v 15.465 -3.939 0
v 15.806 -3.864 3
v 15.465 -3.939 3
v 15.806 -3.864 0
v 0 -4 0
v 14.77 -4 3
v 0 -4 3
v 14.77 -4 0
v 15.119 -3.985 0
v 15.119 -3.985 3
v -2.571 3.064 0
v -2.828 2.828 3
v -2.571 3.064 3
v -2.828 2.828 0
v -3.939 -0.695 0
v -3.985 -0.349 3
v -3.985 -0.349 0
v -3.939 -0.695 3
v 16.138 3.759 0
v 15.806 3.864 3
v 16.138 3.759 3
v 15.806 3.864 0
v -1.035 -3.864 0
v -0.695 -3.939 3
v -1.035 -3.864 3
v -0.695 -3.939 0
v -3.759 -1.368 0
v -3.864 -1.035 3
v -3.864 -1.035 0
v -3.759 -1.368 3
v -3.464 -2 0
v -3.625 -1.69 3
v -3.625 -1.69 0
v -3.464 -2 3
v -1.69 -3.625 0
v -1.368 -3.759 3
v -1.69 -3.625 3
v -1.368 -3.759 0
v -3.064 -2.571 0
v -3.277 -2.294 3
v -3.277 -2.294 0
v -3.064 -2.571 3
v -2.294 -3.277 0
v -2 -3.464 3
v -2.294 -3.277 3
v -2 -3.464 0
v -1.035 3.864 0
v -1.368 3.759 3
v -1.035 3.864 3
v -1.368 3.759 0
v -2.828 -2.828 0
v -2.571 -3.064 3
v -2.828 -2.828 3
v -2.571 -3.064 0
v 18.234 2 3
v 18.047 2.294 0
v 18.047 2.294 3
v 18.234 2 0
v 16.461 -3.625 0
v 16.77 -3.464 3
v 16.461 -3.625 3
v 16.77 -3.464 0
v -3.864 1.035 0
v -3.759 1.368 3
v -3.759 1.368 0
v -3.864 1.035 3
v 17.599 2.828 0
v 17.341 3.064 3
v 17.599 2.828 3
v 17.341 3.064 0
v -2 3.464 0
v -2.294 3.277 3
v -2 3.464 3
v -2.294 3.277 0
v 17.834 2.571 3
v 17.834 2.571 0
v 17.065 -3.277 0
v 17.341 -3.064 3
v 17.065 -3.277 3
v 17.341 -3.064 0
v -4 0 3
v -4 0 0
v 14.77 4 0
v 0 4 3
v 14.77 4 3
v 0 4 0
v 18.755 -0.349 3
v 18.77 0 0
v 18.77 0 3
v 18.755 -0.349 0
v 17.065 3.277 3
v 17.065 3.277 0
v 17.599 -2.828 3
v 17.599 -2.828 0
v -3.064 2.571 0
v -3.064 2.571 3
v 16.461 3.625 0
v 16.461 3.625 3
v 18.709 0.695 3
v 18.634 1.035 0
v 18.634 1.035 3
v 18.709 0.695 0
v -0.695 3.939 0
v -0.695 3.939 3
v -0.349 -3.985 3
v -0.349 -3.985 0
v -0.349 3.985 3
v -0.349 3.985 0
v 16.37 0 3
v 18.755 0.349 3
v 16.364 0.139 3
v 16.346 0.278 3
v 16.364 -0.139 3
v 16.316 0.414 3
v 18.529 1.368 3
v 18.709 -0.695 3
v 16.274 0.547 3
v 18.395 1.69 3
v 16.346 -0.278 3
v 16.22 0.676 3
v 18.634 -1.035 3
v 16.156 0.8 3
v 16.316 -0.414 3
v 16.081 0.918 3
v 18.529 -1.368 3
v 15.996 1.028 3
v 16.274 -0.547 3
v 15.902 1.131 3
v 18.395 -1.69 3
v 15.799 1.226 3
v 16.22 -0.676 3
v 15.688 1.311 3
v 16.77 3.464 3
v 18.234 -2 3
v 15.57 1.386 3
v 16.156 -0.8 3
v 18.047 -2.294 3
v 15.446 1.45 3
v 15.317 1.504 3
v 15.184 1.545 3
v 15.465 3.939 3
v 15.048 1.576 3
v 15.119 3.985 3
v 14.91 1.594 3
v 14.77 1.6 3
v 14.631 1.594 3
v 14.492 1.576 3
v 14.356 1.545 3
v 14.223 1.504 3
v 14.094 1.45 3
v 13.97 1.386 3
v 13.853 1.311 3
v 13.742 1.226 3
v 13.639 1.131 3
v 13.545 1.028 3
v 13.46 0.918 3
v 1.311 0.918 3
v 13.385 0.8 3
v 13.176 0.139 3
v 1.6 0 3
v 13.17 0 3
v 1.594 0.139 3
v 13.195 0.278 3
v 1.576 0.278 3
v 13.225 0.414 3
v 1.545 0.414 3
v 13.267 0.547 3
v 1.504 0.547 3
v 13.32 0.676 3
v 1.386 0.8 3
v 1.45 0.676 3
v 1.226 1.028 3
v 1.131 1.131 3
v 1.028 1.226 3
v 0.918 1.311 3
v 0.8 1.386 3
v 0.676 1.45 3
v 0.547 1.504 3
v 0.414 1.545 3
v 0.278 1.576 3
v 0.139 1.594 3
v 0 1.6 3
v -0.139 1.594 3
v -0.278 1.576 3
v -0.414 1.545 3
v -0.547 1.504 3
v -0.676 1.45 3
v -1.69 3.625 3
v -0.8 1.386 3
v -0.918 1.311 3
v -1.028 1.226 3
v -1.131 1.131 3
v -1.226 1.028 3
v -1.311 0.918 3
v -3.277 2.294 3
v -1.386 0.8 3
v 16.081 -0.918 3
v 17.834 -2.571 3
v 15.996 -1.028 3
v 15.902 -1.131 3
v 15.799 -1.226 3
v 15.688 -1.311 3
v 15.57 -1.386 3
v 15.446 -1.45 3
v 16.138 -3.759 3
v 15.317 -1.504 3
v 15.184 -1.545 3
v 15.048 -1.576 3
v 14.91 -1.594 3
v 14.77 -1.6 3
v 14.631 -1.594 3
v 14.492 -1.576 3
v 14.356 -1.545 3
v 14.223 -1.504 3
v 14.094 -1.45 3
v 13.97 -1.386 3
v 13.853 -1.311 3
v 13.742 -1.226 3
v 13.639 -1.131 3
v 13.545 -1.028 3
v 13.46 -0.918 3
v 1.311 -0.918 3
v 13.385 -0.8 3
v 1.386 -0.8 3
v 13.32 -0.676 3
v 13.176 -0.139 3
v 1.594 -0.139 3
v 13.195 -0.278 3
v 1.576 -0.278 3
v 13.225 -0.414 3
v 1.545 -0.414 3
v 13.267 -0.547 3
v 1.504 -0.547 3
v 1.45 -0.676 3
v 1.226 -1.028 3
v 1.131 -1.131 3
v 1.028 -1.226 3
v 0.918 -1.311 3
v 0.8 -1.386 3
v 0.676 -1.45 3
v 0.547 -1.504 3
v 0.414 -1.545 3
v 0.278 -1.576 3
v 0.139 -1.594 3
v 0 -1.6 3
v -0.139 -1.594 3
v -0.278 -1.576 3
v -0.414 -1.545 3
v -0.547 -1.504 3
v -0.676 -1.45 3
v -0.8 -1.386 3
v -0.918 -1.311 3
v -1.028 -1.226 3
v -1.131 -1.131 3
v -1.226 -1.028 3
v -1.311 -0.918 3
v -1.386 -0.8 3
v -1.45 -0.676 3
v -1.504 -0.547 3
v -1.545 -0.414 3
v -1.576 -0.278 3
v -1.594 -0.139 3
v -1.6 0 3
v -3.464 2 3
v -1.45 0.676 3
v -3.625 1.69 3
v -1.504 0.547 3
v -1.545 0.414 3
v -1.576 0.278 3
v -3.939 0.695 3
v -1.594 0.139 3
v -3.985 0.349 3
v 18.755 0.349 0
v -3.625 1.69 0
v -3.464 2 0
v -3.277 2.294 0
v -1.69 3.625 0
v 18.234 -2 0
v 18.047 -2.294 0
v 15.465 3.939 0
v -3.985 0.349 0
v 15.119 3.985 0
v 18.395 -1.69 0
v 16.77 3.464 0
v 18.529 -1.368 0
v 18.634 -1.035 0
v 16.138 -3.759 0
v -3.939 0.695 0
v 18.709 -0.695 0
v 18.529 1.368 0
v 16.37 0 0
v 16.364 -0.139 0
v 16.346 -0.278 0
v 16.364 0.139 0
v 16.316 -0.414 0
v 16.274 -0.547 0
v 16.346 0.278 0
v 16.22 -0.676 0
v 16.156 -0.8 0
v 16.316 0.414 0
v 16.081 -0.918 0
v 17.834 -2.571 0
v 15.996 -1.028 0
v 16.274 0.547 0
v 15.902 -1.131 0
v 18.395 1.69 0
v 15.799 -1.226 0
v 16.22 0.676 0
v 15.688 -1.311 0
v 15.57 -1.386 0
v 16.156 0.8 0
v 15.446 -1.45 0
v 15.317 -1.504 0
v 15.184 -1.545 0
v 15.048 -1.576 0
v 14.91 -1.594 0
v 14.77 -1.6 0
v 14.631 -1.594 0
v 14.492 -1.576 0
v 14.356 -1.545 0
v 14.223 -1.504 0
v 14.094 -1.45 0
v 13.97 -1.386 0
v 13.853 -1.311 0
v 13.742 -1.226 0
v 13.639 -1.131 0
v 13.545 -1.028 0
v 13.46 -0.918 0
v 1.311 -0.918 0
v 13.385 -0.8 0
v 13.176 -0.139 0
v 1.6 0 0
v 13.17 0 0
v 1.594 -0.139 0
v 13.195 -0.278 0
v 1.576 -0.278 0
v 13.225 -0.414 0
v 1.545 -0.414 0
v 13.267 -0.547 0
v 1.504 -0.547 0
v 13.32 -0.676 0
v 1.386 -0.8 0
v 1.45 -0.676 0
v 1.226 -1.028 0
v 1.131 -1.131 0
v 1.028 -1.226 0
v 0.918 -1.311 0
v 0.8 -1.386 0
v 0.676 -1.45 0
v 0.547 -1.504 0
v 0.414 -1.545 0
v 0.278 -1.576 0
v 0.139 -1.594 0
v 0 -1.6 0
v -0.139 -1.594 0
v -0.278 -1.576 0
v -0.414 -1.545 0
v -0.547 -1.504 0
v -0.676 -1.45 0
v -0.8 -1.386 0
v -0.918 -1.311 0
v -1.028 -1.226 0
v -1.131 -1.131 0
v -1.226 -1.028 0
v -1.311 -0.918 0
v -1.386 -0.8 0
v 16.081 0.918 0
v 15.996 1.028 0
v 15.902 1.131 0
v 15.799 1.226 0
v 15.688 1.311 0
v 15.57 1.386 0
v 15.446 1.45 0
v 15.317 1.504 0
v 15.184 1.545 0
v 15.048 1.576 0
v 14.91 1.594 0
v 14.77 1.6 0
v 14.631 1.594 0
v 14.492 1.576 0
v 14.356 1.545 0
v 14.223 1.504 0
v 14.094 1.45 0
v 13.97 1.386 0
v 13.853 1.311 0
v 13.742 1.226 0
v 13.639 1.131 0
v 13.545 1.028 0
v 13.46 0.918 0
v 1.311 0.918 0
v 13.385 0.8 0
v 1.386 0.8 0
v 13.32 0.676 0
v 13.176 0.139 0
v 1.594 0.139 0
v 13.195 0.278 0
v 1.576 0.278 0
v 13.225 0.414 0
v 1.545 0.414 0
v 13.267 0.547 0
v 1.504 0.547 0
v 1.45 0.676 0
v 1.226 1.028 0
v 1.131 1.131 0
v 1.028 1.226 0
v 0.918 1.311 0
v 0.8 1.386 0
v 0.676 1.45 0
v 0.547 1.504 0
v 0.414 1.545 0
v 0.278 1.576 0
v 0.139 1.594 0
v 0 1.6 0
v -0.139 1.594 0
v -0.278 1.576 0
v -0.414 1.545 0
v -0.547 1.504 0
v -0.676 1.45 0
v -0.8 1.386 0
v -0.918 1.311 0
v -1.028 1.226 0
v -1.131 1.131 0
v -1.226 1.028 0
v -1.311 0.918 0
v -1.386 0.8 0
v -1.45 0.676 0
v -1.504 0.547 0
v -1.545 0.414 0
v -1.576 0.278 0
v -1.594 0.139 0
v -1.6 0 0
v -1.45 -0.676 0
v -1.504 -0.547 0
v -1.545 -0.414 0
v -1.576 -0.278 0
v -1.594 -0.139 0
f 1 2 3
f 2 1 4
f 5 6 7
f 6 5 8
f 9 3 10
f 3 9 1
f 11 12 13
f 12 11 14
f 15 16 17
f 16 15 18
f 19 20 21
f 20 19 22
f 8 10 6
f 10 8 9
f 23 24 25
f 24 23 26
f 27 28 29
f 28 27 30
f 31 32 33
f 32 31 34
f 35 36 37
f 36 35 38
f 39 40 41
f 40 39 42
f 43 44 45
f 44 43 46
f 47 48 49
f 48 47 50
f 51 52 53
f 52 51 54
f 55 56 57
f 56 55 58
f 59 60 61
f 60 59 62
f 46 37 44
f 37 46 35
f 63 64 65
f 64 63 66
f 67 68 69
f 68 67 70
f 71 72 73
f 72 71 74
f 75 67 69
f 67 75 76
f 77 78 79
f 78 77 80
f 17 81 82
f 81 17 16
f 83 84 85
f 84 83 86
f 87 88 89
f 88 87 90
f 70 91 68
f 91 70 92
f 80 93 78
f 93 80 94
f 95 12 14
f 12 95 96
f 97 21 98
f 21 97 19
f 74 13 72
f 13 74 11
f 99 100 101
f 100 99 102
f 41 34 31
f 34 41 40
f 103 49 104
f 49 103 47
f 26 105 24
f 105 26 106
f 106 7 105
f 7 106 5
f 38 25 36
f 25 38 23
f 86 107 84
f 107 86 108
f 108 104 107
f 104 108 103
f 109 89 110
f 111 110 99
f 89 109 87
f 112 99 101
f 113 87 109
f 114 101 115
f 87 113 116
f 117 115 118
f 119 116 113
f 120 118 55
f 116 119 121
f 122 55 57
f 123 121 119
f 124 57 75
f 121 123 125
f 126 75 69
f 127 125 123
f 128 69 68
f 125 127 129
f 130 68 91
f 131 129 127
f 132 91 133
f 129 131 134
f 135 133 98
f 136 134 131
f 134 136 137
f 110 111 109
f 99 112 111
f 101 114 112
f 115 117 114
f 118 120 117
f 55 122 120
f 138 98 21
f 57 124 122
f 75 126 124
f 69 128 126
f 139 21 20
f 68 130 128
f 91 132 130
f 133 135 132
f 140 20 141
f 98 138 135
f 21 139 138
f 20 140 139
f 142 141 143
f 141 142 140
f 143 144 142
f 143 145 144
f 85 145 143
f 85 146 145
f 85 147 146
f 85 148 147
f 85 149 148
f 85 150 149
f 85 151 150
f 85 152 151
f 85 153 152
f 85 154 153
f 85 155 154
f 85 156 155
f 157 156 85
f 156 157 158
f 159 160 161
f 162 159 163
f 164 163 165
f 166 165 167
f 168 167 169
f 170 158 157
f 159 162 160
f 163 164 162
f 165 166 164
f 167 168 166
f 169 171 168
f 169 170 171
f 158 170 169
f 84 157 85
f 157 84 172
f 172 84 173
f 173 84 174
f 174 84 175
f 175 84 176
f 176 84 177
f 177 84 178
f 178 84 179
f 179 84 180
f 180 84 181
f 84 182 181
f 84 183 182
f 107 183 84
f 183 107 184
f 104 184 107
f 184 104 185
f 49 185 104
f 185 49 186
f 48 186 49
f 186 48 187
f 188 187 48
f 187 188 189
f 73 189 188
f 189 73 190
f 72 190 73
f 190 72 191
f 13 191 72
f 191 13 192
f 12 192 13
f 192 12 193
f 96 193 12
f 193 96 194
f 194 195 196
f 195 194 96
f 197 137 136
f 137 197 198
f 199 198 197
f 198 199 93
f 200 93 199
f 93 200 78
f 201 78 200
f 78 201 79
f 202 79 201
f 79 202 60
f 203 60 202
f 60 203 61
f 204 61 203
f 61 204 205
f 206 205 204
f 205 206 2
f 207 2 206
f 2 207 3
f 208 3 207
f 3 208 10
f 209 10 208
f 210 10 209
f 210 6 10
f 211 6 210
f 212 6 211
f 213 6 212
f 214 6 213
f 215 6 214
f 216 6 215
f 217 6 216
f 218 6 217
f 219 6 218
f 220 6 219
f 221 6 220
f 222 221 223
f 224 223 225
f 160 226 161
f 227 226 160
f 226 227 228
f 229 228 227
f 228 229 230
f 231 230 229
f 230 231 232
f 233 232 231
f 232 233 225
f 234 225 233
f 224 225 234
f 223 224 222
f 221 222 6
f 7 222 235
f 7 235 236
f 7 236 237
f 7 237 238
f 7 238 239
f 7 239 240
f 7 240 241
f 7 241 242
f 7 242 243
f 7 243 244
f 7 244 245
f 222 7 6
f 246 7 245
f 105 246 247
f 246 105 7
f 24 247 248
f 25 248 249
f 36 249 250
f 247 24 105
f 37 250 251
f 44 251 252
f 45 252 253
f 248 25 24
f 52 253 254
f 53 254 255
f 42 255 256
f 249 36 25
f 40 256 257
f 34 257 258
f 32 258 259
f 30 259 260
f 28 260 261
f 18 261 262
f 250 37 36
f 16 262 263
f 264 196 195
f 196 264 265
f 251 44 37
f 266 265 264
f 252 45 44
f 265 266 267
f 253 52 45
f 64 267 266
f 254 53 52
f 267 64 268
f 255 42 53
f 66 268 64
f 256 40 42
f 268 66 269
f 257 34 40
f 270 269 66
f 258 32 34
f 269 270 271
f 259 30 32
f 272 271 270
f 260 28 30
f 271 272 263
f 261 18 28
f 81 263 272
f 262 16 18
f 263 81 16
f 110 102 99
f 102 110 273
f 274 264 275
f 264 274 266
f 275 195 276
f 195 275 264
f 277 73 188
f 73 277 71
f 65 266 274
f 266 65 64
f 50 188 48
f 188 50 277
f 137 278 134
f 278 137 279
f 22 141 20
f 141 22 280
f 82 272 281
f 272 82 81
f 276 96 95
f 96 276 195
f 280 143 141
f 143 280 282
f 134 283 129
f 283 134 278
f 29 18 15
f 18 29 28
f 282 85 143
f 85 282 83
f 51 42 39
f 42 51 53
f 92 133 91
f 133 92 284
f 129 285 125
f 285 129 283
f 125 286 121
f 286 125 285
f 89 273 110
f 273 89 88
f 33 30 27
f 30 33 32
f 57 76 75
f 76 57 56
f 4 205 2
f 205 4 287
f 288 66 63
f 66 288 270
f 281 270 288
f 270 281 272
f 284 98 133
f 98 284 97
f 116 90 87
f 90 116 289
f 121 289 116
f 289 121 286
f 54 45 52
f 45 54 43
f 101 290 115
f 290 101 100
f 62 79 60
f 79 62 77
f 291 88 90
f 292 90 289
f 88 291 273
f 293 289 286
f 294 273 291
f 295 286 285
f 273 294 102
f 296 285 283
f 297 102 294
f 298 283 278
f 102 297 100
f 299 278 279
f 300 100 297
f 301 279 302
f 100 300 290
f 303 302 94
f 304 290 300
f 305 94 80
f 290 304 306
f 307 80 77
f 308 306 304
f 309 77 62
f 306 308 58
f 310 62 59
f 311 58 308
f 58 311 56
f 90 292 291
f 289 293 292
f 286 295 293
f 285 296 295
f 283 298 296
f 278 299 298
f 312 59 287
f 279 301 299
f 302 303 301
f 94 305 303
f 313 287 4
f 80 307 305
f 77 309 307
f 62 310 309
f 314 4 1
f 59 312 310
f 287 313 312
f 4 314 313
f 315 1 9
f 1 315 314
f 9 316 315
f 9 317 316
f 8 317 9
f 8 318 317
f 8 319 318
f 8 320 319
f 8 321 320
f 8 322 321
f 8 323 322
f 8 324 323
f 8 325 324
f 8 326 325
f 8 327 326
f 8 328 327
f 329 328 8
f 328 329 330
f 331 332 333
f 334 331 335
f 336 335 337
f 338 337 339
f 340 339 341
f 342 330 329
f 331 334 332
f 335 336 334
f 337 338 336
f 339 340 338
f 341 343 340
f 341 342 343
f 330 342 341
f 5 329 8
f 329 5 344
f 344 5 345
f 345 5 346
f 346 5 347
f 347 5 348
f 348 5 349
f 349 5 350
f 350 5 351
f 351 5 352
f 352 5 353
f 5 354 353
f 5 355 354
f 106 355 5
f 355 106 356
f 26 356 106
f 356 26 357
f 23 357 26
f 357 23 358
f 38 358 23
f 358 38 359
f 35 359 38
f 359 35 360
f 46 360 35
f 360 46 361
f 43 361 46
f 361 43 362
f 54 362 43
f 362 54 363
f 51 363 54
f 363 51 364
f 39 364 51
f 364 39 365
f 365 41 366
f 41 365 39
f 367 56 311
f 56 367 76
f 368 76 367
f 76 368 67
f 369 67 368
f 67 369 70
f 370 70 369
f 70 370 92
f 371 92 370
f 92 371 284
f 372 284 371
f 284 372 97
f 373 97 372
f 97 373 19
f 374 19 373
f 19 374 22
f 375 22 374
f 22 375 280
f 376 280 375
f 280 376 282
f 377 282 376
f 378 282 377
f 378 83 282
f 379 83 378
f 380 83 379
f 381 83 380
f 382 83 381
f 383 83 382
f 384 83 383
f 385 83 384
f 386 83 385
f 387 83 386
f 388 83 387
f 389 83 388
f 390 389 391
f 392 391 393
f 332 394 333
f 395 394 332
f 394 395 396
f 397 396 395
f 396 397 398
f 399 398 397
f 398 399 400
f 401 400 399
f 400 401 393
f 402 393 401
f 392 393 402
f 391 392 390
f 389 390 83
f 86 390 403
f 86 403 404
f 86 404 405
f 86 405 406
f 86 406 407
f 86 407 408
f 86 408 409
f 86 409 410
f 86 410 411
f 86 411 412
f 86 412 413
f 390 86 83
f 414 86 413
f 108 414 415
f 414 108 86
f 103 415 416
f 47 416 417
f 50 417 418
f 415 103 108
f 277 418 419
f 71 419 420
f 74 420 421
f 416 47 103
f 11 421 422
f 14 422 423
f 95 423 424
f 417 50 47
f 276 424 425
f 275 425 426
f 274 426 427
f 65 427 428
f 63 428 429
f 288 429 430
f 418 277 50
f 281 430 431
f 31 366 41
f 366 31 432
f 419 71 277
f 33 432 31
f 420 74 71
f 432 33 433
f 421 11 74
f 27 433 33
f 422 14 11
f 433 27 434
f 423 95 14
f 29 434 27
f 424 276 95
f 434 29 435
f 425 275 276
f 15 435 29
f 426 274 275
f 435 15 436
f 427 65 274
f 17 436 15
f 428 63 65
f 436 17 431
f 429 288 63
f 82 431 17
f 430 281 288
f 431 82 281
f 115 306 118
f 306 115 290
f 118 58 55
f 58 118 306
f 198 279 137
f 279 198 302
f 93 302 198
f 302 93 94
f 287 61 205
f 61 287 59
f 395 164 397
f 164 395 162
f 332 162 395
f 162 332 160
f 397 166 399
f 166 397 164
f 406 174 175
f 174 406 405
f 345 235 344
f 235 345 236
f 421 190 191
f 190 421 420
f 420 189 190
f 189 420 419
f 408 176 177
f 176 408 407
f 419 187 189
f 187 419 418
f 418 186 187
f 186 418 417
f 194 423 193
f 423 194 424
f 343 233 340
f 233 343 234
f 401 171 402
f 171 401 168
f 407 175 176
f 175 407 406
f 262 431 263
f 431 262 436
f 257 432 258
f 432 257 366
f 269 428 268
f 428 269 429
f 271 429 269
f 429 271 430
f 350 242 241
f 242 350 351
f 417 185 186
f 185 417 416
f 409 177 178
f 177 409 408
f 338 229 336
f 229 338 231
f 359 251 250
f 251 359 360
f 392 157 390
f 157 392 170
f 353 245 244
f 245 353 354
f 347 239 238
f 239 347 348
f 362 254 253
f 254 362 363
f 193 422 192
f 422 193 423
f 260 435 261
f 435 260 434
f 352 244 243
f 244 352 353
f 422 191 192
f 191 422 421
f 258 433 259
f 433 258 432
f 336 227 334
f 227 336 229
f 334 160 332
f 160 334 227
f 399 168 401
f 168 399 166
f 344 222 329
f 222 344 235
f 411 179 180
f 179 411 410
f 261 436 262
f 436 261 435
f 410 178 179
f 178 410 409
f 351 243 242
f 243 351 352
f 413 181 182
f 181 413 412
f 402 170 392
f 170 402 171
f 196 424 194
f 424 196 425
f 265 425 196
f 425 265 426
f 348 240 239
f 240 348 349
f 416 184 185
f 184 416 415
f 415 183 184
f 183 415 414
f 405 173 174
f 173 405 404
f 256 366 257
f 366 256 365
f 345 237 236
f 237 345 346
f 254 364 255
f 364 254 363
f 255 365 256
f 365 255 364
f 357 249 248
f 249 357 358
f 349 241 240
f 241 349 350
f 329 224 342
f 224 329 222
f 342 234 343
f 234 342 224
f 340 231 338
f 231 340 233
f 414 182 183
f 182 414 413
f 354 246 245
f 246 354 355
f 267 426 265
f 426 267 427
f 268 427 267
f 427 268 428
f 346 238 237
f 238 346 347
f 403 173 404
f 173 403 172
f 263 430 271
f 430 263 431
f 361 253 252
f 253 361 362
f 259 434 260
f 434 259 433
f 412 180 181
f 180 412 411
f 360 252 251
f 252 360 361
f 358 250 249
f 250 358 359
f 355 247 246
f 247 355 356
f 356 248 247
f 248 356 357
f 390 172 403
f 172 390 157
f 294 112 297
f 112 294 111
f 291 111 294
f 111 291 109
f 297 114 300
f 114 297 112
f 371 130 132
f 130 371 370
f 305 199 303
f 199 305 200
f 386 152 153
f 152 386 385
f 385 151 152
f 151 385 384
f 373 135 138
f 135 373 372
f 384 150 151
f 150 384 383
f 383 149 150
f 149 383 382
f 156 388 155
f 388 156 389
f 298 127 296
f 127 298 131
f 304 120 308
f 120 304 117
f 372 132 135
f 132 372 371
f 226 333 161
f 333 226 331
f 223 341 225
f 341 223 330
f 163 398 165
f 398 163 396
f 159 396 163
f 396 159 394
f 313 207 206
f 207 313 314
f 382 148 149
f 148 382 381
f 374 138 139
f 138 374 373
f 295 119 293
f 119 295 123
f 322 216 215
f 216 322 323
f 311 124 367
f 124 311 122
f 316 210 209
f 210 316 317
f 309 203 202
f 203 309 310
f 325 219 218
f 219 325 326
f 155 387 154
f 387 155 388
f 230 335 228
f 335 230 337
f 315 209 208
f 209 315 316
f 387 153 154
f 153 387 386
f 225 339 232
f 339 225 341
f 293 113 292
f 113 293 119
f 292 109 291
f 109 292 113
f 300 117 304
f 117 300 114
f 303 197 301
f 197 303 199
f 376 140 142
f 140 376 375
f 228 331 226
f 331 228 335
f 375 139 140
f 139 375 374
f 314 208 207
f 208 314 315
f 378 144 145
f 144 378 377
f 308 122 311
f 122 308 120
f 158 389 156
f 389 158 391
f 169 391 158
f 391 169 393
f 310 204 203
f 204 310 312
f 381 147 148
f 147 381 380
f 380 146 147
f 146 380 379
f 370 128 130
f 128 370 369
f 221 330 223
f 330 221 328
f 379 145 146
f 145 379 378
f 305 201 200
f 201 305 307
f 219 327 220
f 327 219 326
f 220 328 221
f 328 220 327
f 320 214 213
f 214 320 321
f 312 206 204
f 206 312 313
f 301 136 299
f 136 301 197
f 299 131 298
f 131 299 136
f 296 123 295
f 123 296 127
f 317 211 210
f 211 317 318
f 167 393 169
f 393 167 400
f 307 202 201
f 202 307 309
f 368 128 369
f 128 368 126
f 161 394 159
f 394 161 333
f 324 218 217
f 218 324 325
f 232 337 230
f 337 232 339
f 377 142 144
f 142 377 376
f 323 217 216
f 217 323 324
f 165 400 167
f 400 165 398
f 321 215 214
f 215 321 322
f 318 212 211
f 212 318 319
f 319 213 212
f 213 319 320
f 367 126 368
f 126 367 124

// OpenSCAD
// Printable/cuttable nominal drilling profiles. Verify fits; finish hub clamps/retainers in CAD.
part="link_crank1"; $fn=72;
module link(L,r,bore,tip){difference(){linear_extrude(3)union(){hull(){circle(r=4);translate([L,0])circle(r=4);}circle(r=r);}translate([0,0,-1])cylinder(h=5,d=bore);translate([L,0,-1])cylinder(h=5,d=tip);}}
if(part=="link_crank1")link(14.770246488065762,4,3.2,3.2);
if(part=="link_coupler1")link(25.717149821155193,4,3.2,3.2);
if(part=="link_rocker1")link(30.969172662534824,4,3.2,3.2);
if(part=="link_crank2_direct")link(15.426379203029766,4,3.2,3.2);
if(part=="link_rod2_direct")link(143.08445221772175,4,3.2,3.2);
if(part=="link_elbow_horn")link(26.337038548069998,4,3.2,3.2);
if(part=="gear_R_distribution")difference(){linear_extrude(3)polygon(points=[[15.947761269167506, -0.9286186151123661], [16.458010533880298, -0.8717324097064117], [16.97129693137109, -0.7391934490722933], [17.48494252040787, -0.5532650089551149], [17.99713539780449, -0.3211190948737523], [17.999681703362562, -0.10704474594776049], [17.999681703362562, 0.10704474594776049], [17.99713539780449, 0.3211190948737523], [17.48494252040787, 0.5532650089551149], [16.97129693137109, 0.7391934490722933], [16.458010533880298, 0.8717324097064117], [15.947761269167506, 0.9286186151123661], [15.698376225428154, 1.2741600703648297], [15.665207836863848, 1.6321039880655595], [15.62387892156016, 1.9891976886242795], [15.846853550534847, 2.01758632494213], [16.337962039067254, 2.167261990956512], [16.81815479012593, 2.3918603519606503], [17.288890325700464, 2.6690051363761436], [17.749705446255497, 2.9913135193703635], [17.71287233773061, 3.202210728115468], [17.673533496825215, 3.4126549395737604], [17.631694488566005, 3.6226163834818466], [17.0855659684599, 3.756694377974646], [16.546501910445528, 3.845074903761904], [16.017601219169993, 3.8810410086845684], [15.50558710501007, 3.8432005619844793], [15.196955239762518, 4.13703413578551], [15.098579583761056, 4.482788702675352], [14.992338576485418, 4.8262080361322175], [15.20630024044466, 4.8950847825288015], [15.661543842239421, 5.1324528838616645], [16.092290558656405, 5.441462217427872], [16.50408570668974, 5.80038551290694], [16.897830564159506, 6.201880539397448], [16.82287234888603, 6.402418756461172], [16.745534304120532, 6.602051262261035], [16.6658273704061, 6.800749815999921], [16.10436095933375, 6.832194025610534], [15.558235612301397, 6.820016944262944], [15.031731705936048, 6.758185410907602], [14.535388768893464, 6.626906923129228], [14.178020170145595, 6.859026465537559], [14.017787311683518, 7.180817424527975], [13.850252122516656, 7.498867657368203], [14.04791461361305, 7.605886998853538], [14.451790553815561, 7.9228642495056505], [14.818422672787017, 8.305761613395173], [15.157254243406722, 8.734240717591323], [15.470520328914995, 9.20124995599119], [15.359989619011596, 9.384600092910514], [15.247286024743724, 9.56662264749973], [15.13242548960378, 9.747291870134486], [14.57474125278952, 9.675031500017798], [14.040152260427217, 9.562711487435854], [13.53397459803149, 9.405187914512169], [13.070205201529495, 9.184941917105613], [12.676269628295277, 9.347442875501233], [12.459636105189373, 9.63431202142952], [12.236511944062055, 9.916162334432947], [12.411144103231344, 10.057679855688301], [12.749898871093805, 10.443471975561016], [13.039931175534921, 10.887218259281369], [13.294260665987219, 11.37066183020524], [13.516380078713267, 11.887281841016605], [13.374040864938735, 12.047200128782984], [13.229809706898218, 12.205414172377013], [13.08370700809692, 12.361901590219667], [12.54879621335695, 12.188397380613235], [12.043948362630767, 11.979759360112405], [11.575334217404356, 11.731908023967598], [11.159931472010742, 11.430194730218577], [10.74284392776302, 11.517543329361741], [10.477186934819395, 11.759721677524931], [10.206072027430874, 11.995773996324417], [10.351726965940733, 12.166970487894996], [10.613824674135158, 12.608439789052694], [10.817380461773594, 13.097923745126785], [10.978546986295735, 13.619868691797222], [11.101955716042045, 14.168506600169312], [10.9326551896044, 14.299547213293712], [10.761808086892103, 14.428564956394789], [10.589438576606263, 14.55554157811667], [10.09551696950066, 14.286702006783285], [9.637602248468816, 13.988850895918002], [9.222509713086694, 13.659112076539566], [8.869619661075161, 13.286205970801495], [8.443583561891923, 13.295427658911484], [8.137949729384824, 13.484668116123789], [7.828076568739728, 13.666883962116165], [7.93979418235305, 13.861929532809096], [8.116309407778424, 14.34404230768492], [8.226456830404414, 14.86259514705994], [8.288972056301734, 15.405267260322045], [8.309467566789257, 15.967239860303891], [8.118971054062733, 16.06494036787225], [7.927325999853005, 16.160368265978796], [7.7345595150209645, 16.253510055018843], [7.298447003486039, 15.898490131122733], [6.903059148765105, 15.521568892240486], [6.555623701671079, 15.121171449644232], [6.277263590517918, 14.689771402096442], [5.856787084782867, 14.620552145644863], [5.521584406310946, 14.75041035510483], [5.1835053512431495, 14.87258458619865], [5.257481230618842, 15.084837193035362], [5.342402958979984, 15.59117566931145], [5.355391078223272, 16.12113869697807], [5.31712612445659, 16.66605792887816], [5.234010465657324, 17.222227917589223], [5.0288050969074405, 17.28326124599515], [4.8228883336684865, 17.34184961649029], [4.616289305733284, 17.397984740934007], [4.252837178290054, 16.968874242183986], [3.933440649057087, 16.525718476007707], [3.66549378769906, 16.06829746487745], [3.4711428371334323, 15.593094286731857], [3.0705447479433925, 15.44779126447782], [2.717188148690709, 15.513845060610047], [2.362416075939414, 15.571817179897247], [2.396131061229621, 15.794048814920858], [2.386567384919579, 16.3073702430737], [2.3019539059568674, 16.83069620374532], [2.1642118396329524, 17.35930598339962], [1.9803154156210643, 17.890733658926724], [1.767389213563883, 17.91302139137276], [1.5542129896978714, 17.93277507756829], [1.3408169007676194, 17.949991923079406], [1.0624020837033825, 17.461403692849096], [0.8298735456874967, 16.96710453748916], [0.6505398790621778, 16.4682368817429], [0.5468164776073248, 15.965413047287862], [0.17973869242521262, 15.748974379382465], [-0.17973869242521068, 15.748974379382465], [-0.5391224454246613, 15.740770215870612], [-0.5468164776073228, 15.965413047287862], [-0.6505398790621759, 16.4682368817429], [-0.8298735456874947, 16.96710453748916], [-1.0624020837033803, 17.461403692849096], [-1.340816900767617, 17.949991923079406], [-1.5542129896978691, 17.93277507756829], [-1.767389213563881, 17.91302139137276], [-1.980315415621062, 17.890733658926724], [-2.16421183963295, 17.35930598339962], [-2.301953905956865, 16.83069620374532], [-2.386567384919577, 16.3073702430737], [-2.396131061229619, 15.79404881492086], [-2.7171881486907035, 15.513845060610048], [-3.0705447479433876, 15.447791264477821], [-3.4223017985158997, 15.373690201115503], [-3.4711428371334305, 15.593094286731857], [-3.665493787699058, 16.06829746487745], [-3.9334406490570846, 16.525718476007707], [-4.2528371782900525, 16.96887424218399], [-4.616289305733282, 17.397984740934007], [-4.822888333668484, 17.34184961649029], [-5.028805096907438, 17.28326124599515], [-5.234010465657322, 17.222227917589223], [-5.317126124456587, 16.66605792887816], [-5.3553910782232705, 16.12113869697807], [-5.342402958979982, 15.59117566931145], [-5.25748123061884, 15.084837193035362], [-5.521584406310944, 14.750410355104831], [-5.856787084782865, 14.620552145644863], [-6.188938768457273, 14.483077605270454], [-6.27726359051791, 14.689771402096445], [-6.555623701671071, 15.121171449644235], [-6.903059148765097, 15.52156889224049], [-7.2984470034860305, 15.898490131122738], [-7.734559515020956, 16.25351005501885], [-7.927325999852998, 16.1603682659788], [-8.118971054062722, 16.06494036787226], [-8.309467566789248, 15.967239860303895], [-8.288972056301725, 15.405267260322049], [-8.226456830404405, 14.862595147059947], [-8.116309407778413, 14.344042307684925], [-7.9397941823530385, 13.861929532809103], [-8.137949729384813, 13.484668116123796], [-8.443583561891918, 13.295427658911487], [-8.744818851452726, 13.0992611721149], [-8.869619661075163, 13.286205970801495], [-9.222509713086694, 13.659112076539566], [-9.637602248468815, 13.988850895918004], [-10.09551696950066, 14.286702006783285], [-10.58943857660626, 14.555541578116673], [-10.761808086892103, 14.428564956394789], [-10.932655189604397, 14.299547213293714], [-11.101955716042044, 14.168506600169314], [-10.978546986295733, 13.619868691797224], [-10.817380461773592, 13.097923745126787], [-10.613824674135154, 12.608439789052698], [-10.35172696594073, 12.166970487895], [-10.47718693481939, 11.759721677524935], [-10.74284392776302, 11.517543329361741], [-11.002904616716142, 11.269365110575068], [-11.159931472010747, 11.430194730218572], [-11.57533421740436, 11.731908023967595], [-12.04394836263077, 11.979759360112403], [-12.548796213356955, 12.188397380613232], [-13.083707008096926, 12.361901590219663], [-13.229809706898221, 12.20541417237701], [-13.374040864938735, 12.047200128782984], [-13.516380078713269, 11.887281841016604], [-13.29426066598722, 11.370661830205238], [-13.039931175534923, 10.887218259281365], [-12.749898871093807, 10.443471975561016], [-12.411144103231344, 10.057679855688301], [-12.459636105189373, 9.63431202142952], [-12.676269628295278, 9.347442875501228], [-12.886299661786833, 9.055704336308278], [-13.070205201529493, 9.184941917105613], [-13.533974598031488, 9.405187914512172], [-14.040152260427215, 9.562711487435857], [-14.574741252789519, 9.6750315000178], [-15.132425489603774, 9.747291870134493], [-15.247286024743723, 9.566622647499733], [-15.359989619011593, 9.384600092910519], [-15.47052032891499, 9.201249955991196], [-15.157254243406719, 8.73424071759133], [-14.818422672787015, 8.30576161339518], [-14.451790553815556, 7.922864249505658], [-14.047914613613047, 7.605886998853544], [-14.017787311683515, 7.180817424527983], [-14.178020170145594, 6.8590264655375615], [-14.330867227288286, 6.533662411988743], [-14.535388768893462, 6.626906923129232], [-15.031731705936046, 6.758185410907607], [-15.558235612301395, 6.82001694426295], [-16.104360959333746, 6.832194025610539], [-16.665827370406095, 6.800749815999928], [-16.74553430412053, 6.602051262261039], [-16.822872348886026, 6.402418756461181], [-16.897830564159506, 6.201880539397455], [-16.504085706689736, 5.800385512906948], [-16.0922905586564, 5.441462217427879], [-15.661543842239418, 5.132452883861673], [-15.206300240444657, 4.8950847825288095], [-15.098579583761055, 4.482788702675361], [-15.196955239762516, 4.137034135785513], [-15.28741429734519, 3.789124450493261], [-15.50558710501007, 3.843200561984477], [-16.017601219169993, 3.881041008684567], [-16.546501910445528, 3.8450749037619043], [-17.0855659684599, 3.7566943779746444], [-17.631694488566005, 3.6226163834818466], [-17.673533496825215, 3.4126549395737578], [-17.71287233773061, 3.2022107281154715], [-17.749705446255497, 2.991313519370365], [-17.28889032570046, 2.6690051363761453], [-16.81815479012593, 2.391860351960652], [-16.337962039067254, 2.1672619909565145], [-15.846853550534847, 2.0175863249421337], [-15.665207836863848, 1.6321039880655641], [-15.698376225428154, 1.2741600703648277], [-15.723366808738513, 0.9155524003900942], [-15.947761269167506, 0.9286186151123651], [-16.458010533880298, 0.8717324097064113], [-16.97129693137109, 0.7391934490722951], [-17.48494252040787, 0.5532650089551157], [-17.99713539780449, 0.3211190948737543], [-17.999681703362562, 0.10704474594775995], [-17.999681703362562, -0.10704474594775554], [-17.99713539780449, -0.32111909487374984], [-17.48494252040787, -0.5532650089551114], [-16.97129693137109, -0.739193449072291], [-16.458010533880298, -0.8717324097064073], [-15.947761269167506, -0.9286186151123612], [-15.698376225428154, -1.274160070364824], [-15.665207836863848, -1.6321039880655601], [-15.62387892156016, -1.989197688624279], [-15.846853550534847, -2.0175863249421297], [-16.337962039067254, -2.1672619909565105], [-16.81815479012593, -2.3918603519606476], [-17.288890325700464, -2.6690051363761413], [-17.7497054462555, -2.9913135193703604], [-17.71287233773061, -3.202210728115467], [-17.673533496825215, -3.4126549395737538], [-17.63169448856601, -3.6226163834818426], [-17.0855659684599, -3.756694377974641], [-16.546501910445528, -3.8450749037619003], [-16.017601219169997, -3.881041008684563], [-15.505587105010072, -3.843200561984473], [-15.19695523976252, -4.137034135785503], [-15.098579583761058, -4.482788702675351], [-14.992338576485418, -4.826208036132215], [-15.20630024044466, -4.895084782528799], [-15.661543842239421, -5.132452883861663], [-16.092290558656405, -5.441462217427867], [-16.50408570668974, -5.800385512906937], [-16.89783056415951, -6.201880539397443], [-16.822872348886033, -6.40241875646117], [-16.745534304120536, -6.602051262261027], [-16.6658273704061, -6.800749815999915], [-16.10436095933375, -6.832194025610528], [-15.558235612301402, -6.820016944262941], [-15.03173170593605, -6.758185410907596], [-14.535388768893467, -6.626906923129221], [-14.178020170145599, -6.859026465537551], [-14.01778731168352, -7.180817424527973], [-13.850252122516657, -7.498867657368201], [-14.047914613613049, -7.605886998853541], [-14.451790553815558, -7.922864249505655], [-14.818422672787017, -8.305761613395175], [-15.15725424340672, -8.734240717591327], [-15.470520328914994, -9.201249955991193], [-15.359989619011595, -9.384600092910516], [-15.247286024743724, -9.56662264749973], [-15.132425489603776, -9.74729187013449], [-14.57474125278952, -9.675031500017797], [-14.040152260427217, -9.562711487435854], [-13.53397459803149, -9.405187914512169], [-13.070205201529495, -9.184941917105611], [-12.676269628295277, -9.347442875501232], [-12.459636105189372, -9.634312021429523], [-12.236511944062054, -9.916162334432949], [-12.411144103231342, -10.057679855688303], [-12.749898871093805, -10.443471975561017], [-13.039931175534921, -10.887218259281367], [-13.294260665987219, -11.370661830205242], [-13.516380078713267, -11.887281841016605], [-13.374040864938733, -12.047200128782986], [-13.22980970689822, -12.205414172377013], [-13.08370700809692, -12.361901590219667], [-12.54879621335695, -12.188397380613235], [-12.043948362630767, -11.979759360112405], [-11.575334217404357, -11.731908023967597], [-11.159931472010745, -11.430194730218574], [-10.742843927763024, -11.51754332936174], [-10.477186934819393, -11.759721677524931], [-10.206072027430874, -11.995773996324417], [-10.351726965940744, -12.166970487894988], [-10.613824674135174, -12.608439789052682], [-10.817380461773608, -13.097923745126772], [-10.978546986295747, -13.61986869179721], [-11.101955716042067, -14.168506600169296], [-10.932655189604414, -14.299547213293703], [-10.761808086892119, -14.428564956394776], [-10.58943857660627, -14.555541578116664], [-10.095516969500673, -14.286702006783274], [-9.637602248468832, -13.988850895917993], [-9.222509713086703, -13.659112076539559], [-8.869619661075177, -13.286205970801484], [-8.44358356189194, -13.295427658911473], [-8.137949729384829, -13.484668116123785], [-7.828076568739732, -13.666883962116163], [-7.9397941823530545, -13.861929532809095], [-8.116309407778436, -14.344042307684912], [-8.226456830404423, -14.862595147059936], [-8.288972056301743, -15.40526726032204], [-8.309467566789273, -15.967239860303884], [-8.11897105406274, -16.06494036787225], [-7.927325999853018, -16.160368265978793], [-7.734559515020966, -16.253510055018843], [-7.298447003486049, -15.89849013112273], [-6.903059148765115, -15.521568892240483], [-6.555623701671085, -15.121171449644228], [-6.277263590517929, -14.689771402096437], [-5.856787084782878, -14.620552145644858], [-5.521584406310944, -14.750410355104831], [-5.183505351243148, -14.87258458619865], [-5.25748123061884, -15.084837193035362], [-5.3424029589799895, -15.591175669311449], [-5.355391078223274, -16.12113869697807], [-5.317126124456592, -16.666057928878157], [-5.2340104656573345, -17.22222791758922], [-5.028805096907438, -17.28326124599515], [-4.822888333668493, -17.34184961649029], [-4.61628930573328, -17.397984740934007], [-4.252837178290056, -16.968874242183986], [-3.9334406490570886, -16.525718476007707], [-3.6654937876990585, -16.06829746487745], [-3.471142837133438, -15.593094286731855], [-3.070544747943398, -15.44779126447782], [-2.717188148690701, -15.513845060610048], [-2.362416075939406, -15.571817179897248], [-2.396131061229616, -15.79404881492086], [-2.386567384919581, -16.3073702430737], [-2.3019539059568657, -16.83069620374532], [-2.1642118396329506, -17.35930598339962], [-1.9803154156210705, -17.890733658926724], [-1.7673892135638771, -17.91302139137276], [-1.5542129896978736, -17.93277507756829], [-1.3408169007676096, -17.94999192307941], [-1.062402083703381, -17.461403692849096], [-0.8298735456874952, -16.96710453748916], [-0.6505398790621726, -16.4682368817429], [-0.5468164776073267, -15.965413047287862], [-0.17973869242521454, -15.748974379382465], [0.17973869242522275, -15.748974379382465], [0.5391224454246734, -15.740770215870612], [0.546816477607335, -15.965413047287862], [0.6505398790621811, -16.4682368817429], [0.8298735456875039, -16.96710453748916], [1.06240208370339, -17.461403692849096], [1.3408169007676187, -17.949991923079406], [1.554212989697883, -17.932775077568287], [1.7673892135638867, -17.91302139137276], [1.9803154156210798, -17.89073365892672], [2.16421183963296, -17.35930598339962], [2.3019539059568745, -16.830696203745315], [2.3865673849195894, -16.3073702430737], [2.396131061229624, -15.794048814920858], [2.717188148690709, -15.513845060610047], [3.070544747943406, -15.447791264477818], [3.4223017985159183, -15.3736902011155], [3.4711428371334323, -15.593094286731857], [3.6654937876990523, -16.06829746487745], [3.9334406490570824, -16.525718476007707], [4.25283717829005, -16.96887424218399], [4.616289305733273, -17.397984740934007], [4.822888333668486, -17.34184961649029], [5.0288050969074325, -17.28326124599515], [5.234010465657328, -17.222227917589223], [5.317126124456585, -16.66605792887816], [5.355391078223269, -16.12113869697807], [5.342402958979983, -15.59117566931145], [5.2574812306188345, -15.084837193035364], [5.5215844063109385, -14.750410355104833], [5.856787084782873, -14.620552145644861], [6.188938768457281, -14.48307760527045], [6.277263590517911, -14.689771402096444], [6.555623701671066, -15.121171449644237], [6.903059148765095, -15.52156889224049], [7.298447003486029, -15.89849013112274], [7.734559515020945, -16.253510055018854], [7.927325999852997, -16.160368265978803], [8.118971054062719, -16.06494036787226], [8.309467566789253, -15.967239860303893], [8.288972056301724, -15.405267260322052], [8.226456830404404, -14.862595147059947], [8.116309407778418, -14.344042307684923], [7.939794182353037, -13.861929532809103], [8.137949729384811, -13.484668116123796], [8.443583561891922, -13.295427658911485], [8.744818851452731, -13.099261172114897], [8.869619661075161, -13.286205970801495], [9.222509713086685, -13.659112076539573], [9.637602248468813, -13.988850895918008], [10.095516969500657, -14.286702006783285], [10.589438576606252, -14.555541578116678], [10.761808086892101, -14.42856495639479], [10.932655189604395, -14.299547213293717], [11.101955716042049, -14.16850660016931], [10.978546986295731, -13.619868691797226], [10.81738046177359, -13.097923745126788], [10.613824674135158, -12.608439789052694], [10.351726965940728, -12.166970487895002], [10.47718693481939, -11.759721677524936], [10.742843927763026, -11.51754332936174], [11.002904616716146, -11.269365110575064], [11.159931472010737, -11.430194730218583], [11.575334217404343, -11.73190802396761], [12.043948362630756, -11.979759360112418], [12.54879621335694, -12.188397380613244], [13.083707008096907, -12.361901590219682], [13.229809706898209, -12.205414172377024], [13.374040864938722, -12.047200128782997], [13.516380078713262, -11.88728184101661], [13.29426066598721, -11.37066183020525], [13.039931175534912, -10.887218259281378], [12.749898871093801, -10.443471975561023], [12.411144103231333, -10.057679855688313], [12.459636105189364, -9.634312021429531], [12.676269628295273, -9.347442875501237], [12.886299661786827, -9.055704336308285], [13.070205201529491, -9.184941917105613], [13.533974598031483, -9.40518791451218], [14.040152260427213, -9.562711487435859], [14.574741252789519, -9.675031500017804], [15.132425489603769, -9.7472918701345], [15.247286024743719, -9.566622647499734], [15.35998961901159, -9.38460009291052], [15.470520328914994, -9.201249955991193], [15.157254243406719, -8.734240717591332], [14.818422672787014, -8.305761613395182], [14.451790553815561, -7.922864249505652], [14.047914613613045, -7.605886998853546], [14.017787311683513, -7.1808174245279845], [14.178020170145595, -6.859026465537556], [14.330867227288289, -6.533662411988738], [14.535388768893466, -6.626906923129226], [15.031731705936044, -6.7581854109076085], [15.558235612301397, -6.820016944262946], [16.10436095933375, -6.8321940256105345], [16.665827370406095, -6.80074981599993], [16.745534304120532, -6.602051262261033], [16.82287234888603, -6.402418756461176], [16.89783056415951, -6.201880539397442], [16.50408570668974, -5.800385512906943], [16.092290558656405, -5.4414622174278735], [15.661543842239421, -5.132452883861662], [15.206300240444659, -4.895084782528805], [15.098579583761056, -4.482788702675357], [15.19695523976252, -4.137034135785502], [15.287414297345194, -3.7891244504932495], [15.505587105010072, -3.8432005619844722], [16.017601219169993, -3.881041008684569], [16.546501910445528, -3.845074903761899], [17.0855659684599, -3.756694377974639], [17.631694488566005, -3.6226163834818492], [17.673533496825215, -3.4126549395737524], [17.71287233773061, -3.202210728115466], [17.7497054462555, -2.991313519370351], [17.288890325700464, -2.66900513637614], [16.81815479012593, -2.3918603519606463], [16.337962039067254, -2.167261990956502], [15.846853550534847, -2.0175863249421284], [15.665207836863848, -1.632103988065559], [15.698376225428154, -1.2741600703648157], [15.723366808738513, -0.9155524003900822]]);translate([0,0,-1])cylinder(h=5,d=3.2);}
if(part=="gear_L_distribution")difference(){linear_extrude(3)polygon(points=[[15.947761269167506, -0.9286186151123661], [16.458010533880298, -0.8717324097064117], [16.97129693137109, -0.7391934490722933], [17.48494252040787, -0.5532650089551149], [17.99713539780449, -0.3211190948737523], [17.999681703362562, -0.10704474594776049], [17.999681703362562, 0.10704474594776049], [17.99713539780449, 0.3211190948737523], [17.48494252040787, 0.5532650089551149], [16.97129693137109, 0.7391934490722933], [16.458010533880298, 0.8717324097064117], [15.947761269167506, 0.9286186151123661], [15.698376225428154, 1.2741600703648297], [15.665207836863848, 1.6321039880655595], [15.62387892156016, 1.9891976886242795], [15.846853550534847, 2.01758632494213], [16.337962039067254, 2.167261990956512], [16.81815479012593, 2.3918603519606503], [17.288890325700464, 2.6690051363761436], [17.749705446255497, 2.9913135193703635], [17.71287233773061, 3.202210728115468], [17.673533496825215, 3.4126549395737604], [17.631694488566005, 3.6226163834818466], [17.0855659684599, 3.756694377974646], [16.546501910445528, 3.845074903761904], [16.017601219169993, 3.8810410086845684], [15.50558710501007, 3.8432005619844793], [15.196955239762518, 4.13703413578551], [15.098579583761056, 4.482788702675352], [14.992338576485418, 4.8262080361322175], [15.20630024044466, 4.8950847825288015], [15.661543842239421, 5.1324528838616645], [16.092290558656405, 5.441462217427872], [16.50408570668974, 5.80038551290694], [16.897830564159506, 6.201880539397448], [16.82287234888603, 6.402418756461172], [16.745534304120532, 6.602051262261035], [16.6658273704061, 6.800749815999921], [16.10436095933375, 6.832194025610534], [15.558235612301397, 6.820016944262944], [15.031731705936048, 6.758185410907602], [14.535388768893464, 6.626906923129228], [14.178020170145595, 6.859026465537559], [14.017787311683518, 7.180817424527975], [13.850252122516656, 7.498867657368203], [14.04791461361305, 7.605886998853538], [14.451790553815561, 7.9228642495056505], [14.818422672787017, 8.305761613395173], [15.157254243406722, 8.734240717591323], [15.470520328914995, 9.20124995599119], [15.359989619011596, 9.384600092910514], [15.247286024743724, 9.56662264749973], [15.13242548960378, 9.747291870134486], [14.57474125278952, 9.675031500017798], [14.040152260427217, 9.562711487435854], [13.53397459803149, 9.405187914512169], [13.070205201529495, 9.184941917105613], [12.676269628295277, 9.347442875501233], [12.459636105189373, 9.63431202142952], [12.236511944062055, 9.916162334432947], [12.411144103231344, 10.057679855688301], [12.749898871093805, 10.443471975561016], [13.039931175534921, 10.887218259281369], [13.294260665987219, 11.37066183020524], [13.516380078713267, 11.887281841016605], [13.374040864938735, 12.047200128782984], [13.229809706898218, 12.205414172377013], [13.08370700809692, 12.361901590219667], [12.54879621335695, 12.188397380613235], [12.043948362630767, 11.979759360112405], [11.575334217404356, 11.731908023967598], [11.159931472010742, 11.430194730218577], [10.74284392776302, 11.517543329361741], [10.477186934819395, 11.759721677524931], [10.206072027430874, 11.995773996324417], [10.351726965940733, 12.166970487894996], [10.613824674135158, 12.608439789052694], [10.817380461773594, 13.097923745126785], [10.978546986295735, 13.619868691797222], [11.101955716042045, 14.168506600169312], [10.9326551896044, 14.299547213293712], [10.761808086892103, 14.428564956394789], [10.589438576606263, 14.55554157811667], [10.09551696950066, 14.286702006783285], [9.637602248468816, 13.988850895918002], [9.222509713086694, 13.659112076539566], [8.869619661075161, 13.286205970801495], [8.443583561891923, 13.295427658911484], [8.137949729384824, 13.484668116123789], [7.828076568739728, 13.666883962116165], [7.93979418235305, 13.861929532809096], [8.116309407778424, 14.34404230768492], [8.226456830404414, 14.86259514705994], [8.288972056301734, 15.405267260322045], [8.309467566789257, 15.967239860303891], [8.118971054062733, 16.06494036787225], [7.927325999853005, 16.160368265978796], [7.7345595150209645, 16.253510055018843], [7.298447003486039, 15.898490131122733], [6.903059148765105, 15.521568892240486], [6.555623701671079, 15.121171449644232], [6.277263590517918, 14.689771402096442], [5.856787084782867, 14.620552145644863], [5.521584406310946, 14.75041035510483], [5.1835053512431495, 14.87258458619865], [5.257481230618842, 15.084837193035362], [5.342402958979984, 15.59117566931145], [5.355391078223272, 16.12113869697807], [5.31712612445659, 16.66605792887816], [5.234010465657324, 17.222227917589223], [5.0288050969074405, 17.28326124599515], [4.8228883336684865, 17.34184961649029], [4.616289305733284, 17.397984740934007], [4.252837178290054, 16.968874242183986], [3.933440649057087, 16.525718476007707], [3.66549378769906, 16.06829746487745], [3.4711428371334323, 15.593094286731857], [3.0705447479433925, 15.44779126447782], [2.717188148690709, 15.513845060610047], [2.362416075939414, 15.571817179897247], [2.396131061229621, 15.794048814920858], [2.386567384919579, 16.3073702430737], [2.3019539059568674, 16.83069620374532], [2.1642118396329524, 17.35930598339962], [1.9803154156210643, 17.890733658926724], [1.767389213563883, 17.91302139137276], [1.5542129896978714, 17.93277507756829], [1.3408169007676194, 17.949991923079406], [1.0624020837033825, 17.461403692849096], [0.8298735456874967, 16.96710453748916], [0.6505398790621778, 16.4682368817429], [0.5468164776073248, 15.965413047287862], [0.17973869242521262, 15.748974379382465], [-0.17973869242521068, 15.748974379382465], [-0.5391224454246613, 15.740770215870612], [-0.5468164776073228, 15.965413047287862], [-0.6505398790621759, 16.4682368817429], [-0.8298735456874947, 16.96710453748916], [-1.0624020837033803, 17.461403692849096], [-1.340816900767617, 17.949991923079406], [-1.5542129896978691, 17.93277507756829], [-1.767389213563881, 17.91302139137276], [-1.980315415621062, 17.890733658926724], [-2.16421183963295, 17.35930598339962], [-2.301953905956865, 16.83069620374532], [-2.386567384919577, 16.3073702430737], [-2.396131061229619, 15.79404881492086], [-2.7171881486907035, 15.513845060610048], [-3.0705447479433876, 15.447791264477821], [-3.4223017985158997, 15.373690201115503], [-3.4711428371334305, 15.593094286731857], [-3.665493787699058, 16.06829746487745], [-3.9334406490570846, 16.525718476007707], [-4.2528371782900525, 16.96887424218399], [-4.616289305733282, 17.397984740934007], [-4.822888333668484, 17.34184961649029], [-5.028805096907438, 17.28326124599515], [-5.234010465657322, 17.222227917589223], [-5.317126124456587, 16.66605792887816], [-5.3553910782232705, 16.12113869697807], [-5.342402958979982, 15.59117566931145], [-5.25748123061884, 15.084837193035362], [-5.521584406310944, 14.750410355104831], [-5.856787084782865, 14.620552145644863], [-6.188938768457273, 14.483077605270454], [-6.27726359051791, 14.689771402096445], [-6.555623701671071, 15.121171449644235], [-6.903059148765097, 15.52156889224049], [-7.2984470034860305, 15.898490131122738], [-7.734559515020956, 16.25351005501885], [-7.927325999852998, 16.1603682659788], [-8.118971054062722, 16.06494036787226], [-8.309467566789248, 15.967239860303895], [-8.288972056301725, 15.405267260322049], [-8.226456830404405, 14.862595147059947], [-8.116309407778413, 14.344042307684925], [-7.9397941823530385, 13.861929532809103], [-8.137949729384813, 13.484668116123796], [-8.443583561891918, 13.295427658911487], [-8.744818851452726, 13.0992611721149], [-8.869619661075163, 13.286205970801495], [-9.222509713086694, 13.659112076539566], [-9.637602248468815, 13.988850895918004], [-10.09551696950066, 14.286702006783285], [-10.58943857660626, 14.555541578116673], [-10.761808086892103, 14.428564956394789], [-10.932655189604397, 14.299547213293714], [-11.101955716042044, 14.168506600169314], [-10.978546986295733, 13.619868691797224], [-10.817380461773592, 13.097923745126787], [-10.613824674135154, 12.608439789052698], [-10.35172696594073, 12.166970487895], [-10.47718693481939, 11.759721677524935], [-10.74284392776302, 11.517543329361741], [-11.002904616716142, 11.269365110575068], [-11.159931472010747, 11.430194730218572], [-11.57533421740436, 11.731908023967595], [-12.04394836263077, 11.979759360112403], [-12.548796213356955, 12.188397380613232], [-13.083707008096926, 12.361901590219663], [-13.229809706898221, 12.20541417237701], [-13.374040864938735, 12.047200128782984], [-13.516380078713269, 11.887281841016604], [-13.29426066598722, 11.370661830205238], [-13.039931175534923, 10.887218259281365], [-12.749898871093807, 10.443471975561016], [-12.411144103231344, 10.057679855688301], [-12.459636105189373, 9.63431202142952], [-12.676269628295278, 9.347442875501228], [-12.886299661786833, 9.055704336308278], [-13.070205201529493, 9.184941917105613], [-13.533974598031488, 9.405187914512172], [-14.040152260427215, 9.562711487435857], [-14.574741252789519, 9.6750315000178], [-15.132425489603774, 9.747291870134493], [-15.247286024743723, 9.566622647499733], [-15.359989619011593, 9.384600092910519], [-15.47052032891499, 9.201249955991196], [-15.157254243406719, 8.73424071759133], [-14.818422672787015, 8.30576161339518], [-14.451790553815556, 7.922864249505658], [-14.047914613613047, 7.605886998853544], [-14.017787311683515, 7.180817424527983], [-14.178020170145594, 6.8590264655375615], [-14.330867227288286, 6.533662411988743], [-14.535388768893462, 6.626906923129232], [-15.031731705936046, 6.758185410907607], [-15.558235612301395, 6.82001694426295], [-16.104360959333746, 6.832194025610539], [-16.665827370406095, 6.800749815999928], [-16.74553430412053, 6.602051262261039], [-16.822872348886026, 6.402418756461181], [-16.897830564159506, 6.201880539397455], [-16.504085706689736, 5.800385512906948], [-16.0922905586564, 5.441462217427879], [-15.661543842239418, 5.132452883861673], [-15.206300240444657, 4.8950847825288095], [-15.098579583761055, 4.482788702675361], [-15.196955239762516, 4.137034135785513], [-15.28741429734519, 3.789124450493261], [-15.50558710501007, 3.843200561984477], [-16.017601219169993, 3.881041008684567], [-16.546501910445528, 3.8450749037619043], [-17.0855659684599, 3.7566943779746444], [-17.631694488566005, 3.6226163834818466], [-17.673533496825215, 3.4126549395737578], [-17.71287233773061, 3.2022107281154715], [-17.749705446255497, 2.991313519370365], [-17.28889032570046, 2.6690051363761453], [-16.81815479012593, 2.391860351960652], [-16.337962039067254, 2.1672619909565145], [-15.846853550534847, 2.0175863249421337], [-15.665207836863848, 1.6321039880655641], [-15.698376225428154, 1.2741600703648277], [-15.723366808738513, 0.9155524003900942], [-15.947761269167506, 0.9286186151123651], [-16.458010533880298, 0.8717324097064113], [-16.97129693137109, 0.7391934490722951], [-17.48494252040787, 0.5532650089551157], [-17.99713539780449, 0.3211190948737543], [-17.999681703362562, 0.10704474594775995], [-17.999681703362562, -0.10704474594775554], [-17.99713539780449, -0.32111909487374984], [-17.48494252040787, -0.5532650089551114], [-16.97129693137109, -0.739193449072291], [-16.458010533880298, -0.8717324097064073], [-15.947761269167506, -0.9286186151123612], [-15.698376225428154, -1.274160070364824], [-15.665207836863848, -1.6321039880655601], [-15.62387892156016, -1.989197688624279], [-15.846853550534847, -2.0175863249421297], [-16.337962039067254, -2.1672619909565105], [-16.81815479012593, -2.3918603519606476], [-17.288890325700464, -2.6690051363761413], [-17.7497054462555, -2.9913135193703604], [-17.71287233773061, -3.202210728115467], [-17.673533496825215, -3.4126549395737538], [-17.63169448856601, -3.6226163834818426], [-17.0855659684599, -3.756694377974641], [-16.546501910445528, -3.8450749037619003], [-16.017601219169997, -3.881041008684563], [-15.505587105010072, -3.843200561984473], [-15.19695523976252, -4.137034135785503], [-15.098579583761058, -4.482788702675351], [-14.992338576485418, -4.826208036132215], [-15.20630024044466, -4.895084782528799], [-15.661543842239421, -5.132452883861663], [-16.092290558656405, -5.441462217427867], [-16.50408570668974, -5.800385512906937], [-16.89783056415951, -6.201880539397443], [-16.822872348886033, -6.40241875646117], [-16.745534304120536, -6.602051262261027], [-16.6658273704061, -6.800749815999915], [-16.10436095933375, -6.832194025610528], [-15.558235612301402, -6.820016944262941], [-15.03173170593605, -6.758185410907596], [-14.535388768893467, -6.626906923129221], [-14.178020170145599, -6.859026465537551], [-14.01778731168352, -7.180817424527973], [-13.850252122516657, -7.498867657368201], [-14.047914613613049, -7.605886998853541], [-14.451790553815558, -7.922864249505655], [-14.818422672787017, -8.305761613395175], [-15.15725424340672, -8.734240717591327], [-15.470520328914994, -9.201249955991193], [-15.359989619011595, -9.384600092910516], [-15.247286024743724, -9.56662264749973], [-15.132425489603776, -9.74729187013449], [-14.57474125278952, -9.675031500017797], [-14.040152260427217, -9.562711487435854], [-13.53397459803149, -9.405187914512169], [-13.070205201529495, -9.184941917105611], [-12.676269628295277, -9.347442875501232], [-12.459636105189372, -9.634312021429523], [-12.236511944062054, -9.916162334432949], [-12.411144103231342, -10.057679855688303], [-12.749898871093805, -10.443471975561017], [-13.039931175534921, -10.887218259281367], [-13.294260665987219, -11.370661830205242], [-13.516380078713267, -11.887281841016605], [-13.374040864938733, -12.047200128782986], [-13.22980970689822, -12.205414172377013], [-13.08370700809692, -12.361901590219667], [-12.54879621335695, -12.188397380613235], [-12.043948362630767, -11.979759360112405], [-11.575334217404357, -11.731908023967597], [-11.159931472010745, -11.430194730218574], [-10.742843927763024, -11.51754332936174], [-10.477186934819393, -11.759721677524931], [-10.206072027430874, -11.995773996324417], [-10.351726965940744, -12.166970487894988], [-10.613824674135174, -12.608439789052682], [-10.817380461773608, -13.097923745126772], [-10.978546986295747, -13.61986869179721], [-11.101955716042067, -14.168506600169296], [-10.932655189604414, -14.299547213293703], [-10.761808086892119, -14.428564956394776], [-10.58943857660627, -14.555541578116664], [-10.095516969500673, -14.286702006783274], [-9.637602248468832, -13.988850895917993], [-9.222509713086703, -13.659112076539559], [-8.869619661075177, -13.286205970801484], [-8.44358356189194, -13.295427658911473], [-8.137949729384829, -13.484668116123785], [-7.828076568739732, -13.666883962116163], [-7.9397941823530545, -13.861929532809095], [-8.116309407778436, -14.344042307684912], [-8.226456830404423, -14.862595147059936], [-8.288972056301743, -15.40526726032204], [-8.309467566789273, -15.967239860303884], [-8.11897105406274, -16.06494036787225], [-7.927325999853018, -16.160368265978793], [-7.734559515020966, -16.253510055018843], [-7.298447003486049, -15.89849013112273], [-6.903059148765115, -15.521568892240483], [-6.555623701671085, -15.121171449644228], [-6.277263590517929, -14.689771402096437], [-5.856787084782878, -14.620552145644858], [-5.521584406310944, -14.750410355104831], [-5.183505351243148, -14.87258458619865], [-5.25748123061884, -15.084837193035362], [-5.3424029589799895, -15.591175669311449], [-5.355391078223274, -16.12113869697807], [-5.317126124456592, -16.666057928878157], [-5.2340104656573345, -17.22222791758922], [-5.028805096907438, -17.28326124599515], [-4.822888333668493, -17.34184961649029], [-4.61628930573328, -17.397984740934007], [-4.252837178290056, -16.968874242183986], [-3.9334406490570886, -16.525718476007707], [-3.6654937876990585, -16.06829746487745], [-3.471142837133438, -15.593094286731855], [-3.070544747943398, -15.44779126447782], [-2.717188148690701, -15.513845060610048], [-2.362416075939406, -15.571817179897248], [-2.396131061229616, -15.79404881492086], [-2.386567384919581, -16.3073702430737], [-2.3019539059568657, -16.83069620374532], [-2.1642118396329506, -17.35930598339962], [-1.9803154156210705, -17.890733658926724], [-1.7673892135638771, -17.91302139137276], [-1.5542129896978736, -17.93277507756829], [-1.3408169007676096, -17.94999192307941], [-1.062402083703381, -17.461403692849096], [-0.8298735456874952, -16.96710453748916], [-0.6505398790621726, -16.4682368817429], [-0.5468164776073267, -15.965413047287862], [-0.17973869242521454, -15.748974379382465], [0.17973869242522275, -15.748974379382465], [0.5391224454246734, -15.740770215870612], [0.546816477607335, -15.965413047287862], [0.6505398790621811, -16.4682368817429], [0.8298735456875039, -16.96710453748916], [1.06240208370339, -17.461403692849096], [1.3408169007676187, -17.949991923079406], [1.554212989697883, -17.932775077568287], [1.7673892135638867, -17.91302139137276], [1.9803154156210798, -17.89073365892672], [2.16421183963296, -17.35930598339962], [2.3019539059568745, -16.830696203745315], [2.3865673849195894, -16.3073702430737], [2.396131061229624, -15.794048814920858], [2.717188148690709, -15.513845060610047], [3.070544747943406, -15.447791264477818], [3.4223017985159183, -15.3736902011155], [3.4711428371334323, -15.593094286731857], [3.6654937876990523, -16.06829746487745], [3.9334406490570824, -16.525718476007707], [4.25283717829005, -16.96887424218399], [4.616289305733273, -17.397984740934007], [4.822888333668486, -17.34184961649029], [5.0288050969074325, -17.28326124599515], [5.234010465657328, -17.222227917589223], [5.317126124456585, -16.66605792887816], [5.355391078223269, -16.12113869697807], [5.342402958979983, -15.59117566931145], [5.2574812306188345, -15.084837193035364], [5.5215844063109385, -14.750410355104833], [5.856787084782873, -14.620552145644861], [6.188938768457281, -14.48307760527045], [6.277263590517911, -14.689771402096444], [6.555623701671066, -15.121171449644237], [6.903059148765095, -15.52156889224049], [7.298447003486029, -15.89849013112274], [7.734559515020945, -16.253510055018854], [7.927325999852997, -16.160368265978803], [8.118971054062719, -16.06494036787226], [8.309467566789253, -15.967239860303893], [8.288972056301724, -15.405267260322052], [8.226456830404404, -14.862595147059947], [8.116309407778418, -14.344042307684923], [7.939794182353037, -13.861929532809103], [8.137949729384811, -13.484668116123796], [8.443583561891922, -13.295427658911485], [8.744818851452731, -13.099261172114897], [8.869619661075161, -13.286205970801495], [9.222509713086685, -13.659112076539573], [9.637602248468813, -13.988850895918008], [10.095516969500657, -14.286702006783285], [10.589438576606252, -14.555541578116678], [10.761808086892101, -14.42856495639479], [10.932655189604395, -14.299547213293717], [11.101955716042049, -14.16850660016931], [10.978546986295731, -13.619868691797226], [10.81738046177359, -13.097923745126788], [10.613824674135158, -12.608439789052694], [10.351726965940728, -12.166970487895002], [10.47718693481939, -11.759721677524936], [10.742843927763026, -11.51754332936174], [11.002904616716146, -11.269365110575064], [11.159931472010737, -11.430194730218583], [11.575334217404343, -11.73190802396761], [12.043948362630756, -11.979759360112418], [12.54879621335694, -12.188397380613244], [13.083707008096907, -12.361901590219682], [13.229809706898209, -12.205414172377024], [13.374040864938722, -12.047200128782997], [13.516380078713262, -11.88728184101661], [13.29426066598721, -11.37066183020525], [13.039931175534912, -10.887218259281378], [12.749898871093801, -10.443471975561023], [12.411144103231333, -10.057679855688313], [12.459636105189364, -9.634312021429531], [12.676269628295273, -9.347442875501237], [12.886299661786827, -9.055704336308285], [13.070205201529491, -9.184941917105613], [13.533974598031483, -9.40518791451218], [14.040152260427213, -9.562711487435859], [14.574741252789519, -9.675031500017804], [15.132425489603769, -9.7472918701345], [15.247286024743719, -9.566622647499734], [15.35998961901159, -9.38460009291052], [15.470520328914994, -9.201249955991193], [15.157254243406719, -8.734240717591332], [14.818422672787014, -8.305761613395182], [14.451790553815561, -7.922864249505652], [14.047914613613045, -7.605886998853546], [14.017787311683513, -7.1808174245279845], [14.178020170145595, -6.859026465537556], [14.330867227288289, -6.533662411988738], [14.535388768893466, -6.626906923129226], [15.031731705936044, -6.7581854109076085], [15.558235612301397, -6.820016944262946], [16.10436095933375, -6.8321940256105345], [16.665827370406095, -6.80074981599993], [16.745534304120532, -6.602051262261033], [16.82287234888603, -6.402418756461176], [16.89783056415951, -6.201880539397442], [16.50408570668974, -5.800385512906943], [16.092290558656405, -5.4414622174278735], [15.661543842239421, -5.132452883861662], [15.206300240444659, -4.895084782528805], [15.098579583761056, -4.482788702675357], [15.19695523976252, -4.137034135785502], [15.287414297345194, -3.7891244504932495], [15.505587105010072, -3.8432005619844722], [16.017601219169993, -3.881041008684569], [16.546501910445528, -3.845074903761899], [17.0855659684599, -3.756694377974639], [17.631694488566005, -3.6226163834818492], [17.673533496825215, -3.4126549395737524], [17.71287233773061, -3.202210728115466], [17.7497054462555, -2.991313519370351], [17.288890325700464, -2.66900513637614], [16.81815479012593, -2.3918603519606463], [16.337962039067254, -2.167261990956502], [15.846853550534847, -2.0175863249421284], [15.665207836863848, -1.632103988065559], [15.698376225428154, -1.2741600703648157], [15.723366808738513, -0.9155524003900822]]);translate([0,0,-1])cylinder(h=5,d=3.2);}
// Gear root fillets, clamp nut seats, bearing retainers and purchased hardware interfaces require fit verification.
